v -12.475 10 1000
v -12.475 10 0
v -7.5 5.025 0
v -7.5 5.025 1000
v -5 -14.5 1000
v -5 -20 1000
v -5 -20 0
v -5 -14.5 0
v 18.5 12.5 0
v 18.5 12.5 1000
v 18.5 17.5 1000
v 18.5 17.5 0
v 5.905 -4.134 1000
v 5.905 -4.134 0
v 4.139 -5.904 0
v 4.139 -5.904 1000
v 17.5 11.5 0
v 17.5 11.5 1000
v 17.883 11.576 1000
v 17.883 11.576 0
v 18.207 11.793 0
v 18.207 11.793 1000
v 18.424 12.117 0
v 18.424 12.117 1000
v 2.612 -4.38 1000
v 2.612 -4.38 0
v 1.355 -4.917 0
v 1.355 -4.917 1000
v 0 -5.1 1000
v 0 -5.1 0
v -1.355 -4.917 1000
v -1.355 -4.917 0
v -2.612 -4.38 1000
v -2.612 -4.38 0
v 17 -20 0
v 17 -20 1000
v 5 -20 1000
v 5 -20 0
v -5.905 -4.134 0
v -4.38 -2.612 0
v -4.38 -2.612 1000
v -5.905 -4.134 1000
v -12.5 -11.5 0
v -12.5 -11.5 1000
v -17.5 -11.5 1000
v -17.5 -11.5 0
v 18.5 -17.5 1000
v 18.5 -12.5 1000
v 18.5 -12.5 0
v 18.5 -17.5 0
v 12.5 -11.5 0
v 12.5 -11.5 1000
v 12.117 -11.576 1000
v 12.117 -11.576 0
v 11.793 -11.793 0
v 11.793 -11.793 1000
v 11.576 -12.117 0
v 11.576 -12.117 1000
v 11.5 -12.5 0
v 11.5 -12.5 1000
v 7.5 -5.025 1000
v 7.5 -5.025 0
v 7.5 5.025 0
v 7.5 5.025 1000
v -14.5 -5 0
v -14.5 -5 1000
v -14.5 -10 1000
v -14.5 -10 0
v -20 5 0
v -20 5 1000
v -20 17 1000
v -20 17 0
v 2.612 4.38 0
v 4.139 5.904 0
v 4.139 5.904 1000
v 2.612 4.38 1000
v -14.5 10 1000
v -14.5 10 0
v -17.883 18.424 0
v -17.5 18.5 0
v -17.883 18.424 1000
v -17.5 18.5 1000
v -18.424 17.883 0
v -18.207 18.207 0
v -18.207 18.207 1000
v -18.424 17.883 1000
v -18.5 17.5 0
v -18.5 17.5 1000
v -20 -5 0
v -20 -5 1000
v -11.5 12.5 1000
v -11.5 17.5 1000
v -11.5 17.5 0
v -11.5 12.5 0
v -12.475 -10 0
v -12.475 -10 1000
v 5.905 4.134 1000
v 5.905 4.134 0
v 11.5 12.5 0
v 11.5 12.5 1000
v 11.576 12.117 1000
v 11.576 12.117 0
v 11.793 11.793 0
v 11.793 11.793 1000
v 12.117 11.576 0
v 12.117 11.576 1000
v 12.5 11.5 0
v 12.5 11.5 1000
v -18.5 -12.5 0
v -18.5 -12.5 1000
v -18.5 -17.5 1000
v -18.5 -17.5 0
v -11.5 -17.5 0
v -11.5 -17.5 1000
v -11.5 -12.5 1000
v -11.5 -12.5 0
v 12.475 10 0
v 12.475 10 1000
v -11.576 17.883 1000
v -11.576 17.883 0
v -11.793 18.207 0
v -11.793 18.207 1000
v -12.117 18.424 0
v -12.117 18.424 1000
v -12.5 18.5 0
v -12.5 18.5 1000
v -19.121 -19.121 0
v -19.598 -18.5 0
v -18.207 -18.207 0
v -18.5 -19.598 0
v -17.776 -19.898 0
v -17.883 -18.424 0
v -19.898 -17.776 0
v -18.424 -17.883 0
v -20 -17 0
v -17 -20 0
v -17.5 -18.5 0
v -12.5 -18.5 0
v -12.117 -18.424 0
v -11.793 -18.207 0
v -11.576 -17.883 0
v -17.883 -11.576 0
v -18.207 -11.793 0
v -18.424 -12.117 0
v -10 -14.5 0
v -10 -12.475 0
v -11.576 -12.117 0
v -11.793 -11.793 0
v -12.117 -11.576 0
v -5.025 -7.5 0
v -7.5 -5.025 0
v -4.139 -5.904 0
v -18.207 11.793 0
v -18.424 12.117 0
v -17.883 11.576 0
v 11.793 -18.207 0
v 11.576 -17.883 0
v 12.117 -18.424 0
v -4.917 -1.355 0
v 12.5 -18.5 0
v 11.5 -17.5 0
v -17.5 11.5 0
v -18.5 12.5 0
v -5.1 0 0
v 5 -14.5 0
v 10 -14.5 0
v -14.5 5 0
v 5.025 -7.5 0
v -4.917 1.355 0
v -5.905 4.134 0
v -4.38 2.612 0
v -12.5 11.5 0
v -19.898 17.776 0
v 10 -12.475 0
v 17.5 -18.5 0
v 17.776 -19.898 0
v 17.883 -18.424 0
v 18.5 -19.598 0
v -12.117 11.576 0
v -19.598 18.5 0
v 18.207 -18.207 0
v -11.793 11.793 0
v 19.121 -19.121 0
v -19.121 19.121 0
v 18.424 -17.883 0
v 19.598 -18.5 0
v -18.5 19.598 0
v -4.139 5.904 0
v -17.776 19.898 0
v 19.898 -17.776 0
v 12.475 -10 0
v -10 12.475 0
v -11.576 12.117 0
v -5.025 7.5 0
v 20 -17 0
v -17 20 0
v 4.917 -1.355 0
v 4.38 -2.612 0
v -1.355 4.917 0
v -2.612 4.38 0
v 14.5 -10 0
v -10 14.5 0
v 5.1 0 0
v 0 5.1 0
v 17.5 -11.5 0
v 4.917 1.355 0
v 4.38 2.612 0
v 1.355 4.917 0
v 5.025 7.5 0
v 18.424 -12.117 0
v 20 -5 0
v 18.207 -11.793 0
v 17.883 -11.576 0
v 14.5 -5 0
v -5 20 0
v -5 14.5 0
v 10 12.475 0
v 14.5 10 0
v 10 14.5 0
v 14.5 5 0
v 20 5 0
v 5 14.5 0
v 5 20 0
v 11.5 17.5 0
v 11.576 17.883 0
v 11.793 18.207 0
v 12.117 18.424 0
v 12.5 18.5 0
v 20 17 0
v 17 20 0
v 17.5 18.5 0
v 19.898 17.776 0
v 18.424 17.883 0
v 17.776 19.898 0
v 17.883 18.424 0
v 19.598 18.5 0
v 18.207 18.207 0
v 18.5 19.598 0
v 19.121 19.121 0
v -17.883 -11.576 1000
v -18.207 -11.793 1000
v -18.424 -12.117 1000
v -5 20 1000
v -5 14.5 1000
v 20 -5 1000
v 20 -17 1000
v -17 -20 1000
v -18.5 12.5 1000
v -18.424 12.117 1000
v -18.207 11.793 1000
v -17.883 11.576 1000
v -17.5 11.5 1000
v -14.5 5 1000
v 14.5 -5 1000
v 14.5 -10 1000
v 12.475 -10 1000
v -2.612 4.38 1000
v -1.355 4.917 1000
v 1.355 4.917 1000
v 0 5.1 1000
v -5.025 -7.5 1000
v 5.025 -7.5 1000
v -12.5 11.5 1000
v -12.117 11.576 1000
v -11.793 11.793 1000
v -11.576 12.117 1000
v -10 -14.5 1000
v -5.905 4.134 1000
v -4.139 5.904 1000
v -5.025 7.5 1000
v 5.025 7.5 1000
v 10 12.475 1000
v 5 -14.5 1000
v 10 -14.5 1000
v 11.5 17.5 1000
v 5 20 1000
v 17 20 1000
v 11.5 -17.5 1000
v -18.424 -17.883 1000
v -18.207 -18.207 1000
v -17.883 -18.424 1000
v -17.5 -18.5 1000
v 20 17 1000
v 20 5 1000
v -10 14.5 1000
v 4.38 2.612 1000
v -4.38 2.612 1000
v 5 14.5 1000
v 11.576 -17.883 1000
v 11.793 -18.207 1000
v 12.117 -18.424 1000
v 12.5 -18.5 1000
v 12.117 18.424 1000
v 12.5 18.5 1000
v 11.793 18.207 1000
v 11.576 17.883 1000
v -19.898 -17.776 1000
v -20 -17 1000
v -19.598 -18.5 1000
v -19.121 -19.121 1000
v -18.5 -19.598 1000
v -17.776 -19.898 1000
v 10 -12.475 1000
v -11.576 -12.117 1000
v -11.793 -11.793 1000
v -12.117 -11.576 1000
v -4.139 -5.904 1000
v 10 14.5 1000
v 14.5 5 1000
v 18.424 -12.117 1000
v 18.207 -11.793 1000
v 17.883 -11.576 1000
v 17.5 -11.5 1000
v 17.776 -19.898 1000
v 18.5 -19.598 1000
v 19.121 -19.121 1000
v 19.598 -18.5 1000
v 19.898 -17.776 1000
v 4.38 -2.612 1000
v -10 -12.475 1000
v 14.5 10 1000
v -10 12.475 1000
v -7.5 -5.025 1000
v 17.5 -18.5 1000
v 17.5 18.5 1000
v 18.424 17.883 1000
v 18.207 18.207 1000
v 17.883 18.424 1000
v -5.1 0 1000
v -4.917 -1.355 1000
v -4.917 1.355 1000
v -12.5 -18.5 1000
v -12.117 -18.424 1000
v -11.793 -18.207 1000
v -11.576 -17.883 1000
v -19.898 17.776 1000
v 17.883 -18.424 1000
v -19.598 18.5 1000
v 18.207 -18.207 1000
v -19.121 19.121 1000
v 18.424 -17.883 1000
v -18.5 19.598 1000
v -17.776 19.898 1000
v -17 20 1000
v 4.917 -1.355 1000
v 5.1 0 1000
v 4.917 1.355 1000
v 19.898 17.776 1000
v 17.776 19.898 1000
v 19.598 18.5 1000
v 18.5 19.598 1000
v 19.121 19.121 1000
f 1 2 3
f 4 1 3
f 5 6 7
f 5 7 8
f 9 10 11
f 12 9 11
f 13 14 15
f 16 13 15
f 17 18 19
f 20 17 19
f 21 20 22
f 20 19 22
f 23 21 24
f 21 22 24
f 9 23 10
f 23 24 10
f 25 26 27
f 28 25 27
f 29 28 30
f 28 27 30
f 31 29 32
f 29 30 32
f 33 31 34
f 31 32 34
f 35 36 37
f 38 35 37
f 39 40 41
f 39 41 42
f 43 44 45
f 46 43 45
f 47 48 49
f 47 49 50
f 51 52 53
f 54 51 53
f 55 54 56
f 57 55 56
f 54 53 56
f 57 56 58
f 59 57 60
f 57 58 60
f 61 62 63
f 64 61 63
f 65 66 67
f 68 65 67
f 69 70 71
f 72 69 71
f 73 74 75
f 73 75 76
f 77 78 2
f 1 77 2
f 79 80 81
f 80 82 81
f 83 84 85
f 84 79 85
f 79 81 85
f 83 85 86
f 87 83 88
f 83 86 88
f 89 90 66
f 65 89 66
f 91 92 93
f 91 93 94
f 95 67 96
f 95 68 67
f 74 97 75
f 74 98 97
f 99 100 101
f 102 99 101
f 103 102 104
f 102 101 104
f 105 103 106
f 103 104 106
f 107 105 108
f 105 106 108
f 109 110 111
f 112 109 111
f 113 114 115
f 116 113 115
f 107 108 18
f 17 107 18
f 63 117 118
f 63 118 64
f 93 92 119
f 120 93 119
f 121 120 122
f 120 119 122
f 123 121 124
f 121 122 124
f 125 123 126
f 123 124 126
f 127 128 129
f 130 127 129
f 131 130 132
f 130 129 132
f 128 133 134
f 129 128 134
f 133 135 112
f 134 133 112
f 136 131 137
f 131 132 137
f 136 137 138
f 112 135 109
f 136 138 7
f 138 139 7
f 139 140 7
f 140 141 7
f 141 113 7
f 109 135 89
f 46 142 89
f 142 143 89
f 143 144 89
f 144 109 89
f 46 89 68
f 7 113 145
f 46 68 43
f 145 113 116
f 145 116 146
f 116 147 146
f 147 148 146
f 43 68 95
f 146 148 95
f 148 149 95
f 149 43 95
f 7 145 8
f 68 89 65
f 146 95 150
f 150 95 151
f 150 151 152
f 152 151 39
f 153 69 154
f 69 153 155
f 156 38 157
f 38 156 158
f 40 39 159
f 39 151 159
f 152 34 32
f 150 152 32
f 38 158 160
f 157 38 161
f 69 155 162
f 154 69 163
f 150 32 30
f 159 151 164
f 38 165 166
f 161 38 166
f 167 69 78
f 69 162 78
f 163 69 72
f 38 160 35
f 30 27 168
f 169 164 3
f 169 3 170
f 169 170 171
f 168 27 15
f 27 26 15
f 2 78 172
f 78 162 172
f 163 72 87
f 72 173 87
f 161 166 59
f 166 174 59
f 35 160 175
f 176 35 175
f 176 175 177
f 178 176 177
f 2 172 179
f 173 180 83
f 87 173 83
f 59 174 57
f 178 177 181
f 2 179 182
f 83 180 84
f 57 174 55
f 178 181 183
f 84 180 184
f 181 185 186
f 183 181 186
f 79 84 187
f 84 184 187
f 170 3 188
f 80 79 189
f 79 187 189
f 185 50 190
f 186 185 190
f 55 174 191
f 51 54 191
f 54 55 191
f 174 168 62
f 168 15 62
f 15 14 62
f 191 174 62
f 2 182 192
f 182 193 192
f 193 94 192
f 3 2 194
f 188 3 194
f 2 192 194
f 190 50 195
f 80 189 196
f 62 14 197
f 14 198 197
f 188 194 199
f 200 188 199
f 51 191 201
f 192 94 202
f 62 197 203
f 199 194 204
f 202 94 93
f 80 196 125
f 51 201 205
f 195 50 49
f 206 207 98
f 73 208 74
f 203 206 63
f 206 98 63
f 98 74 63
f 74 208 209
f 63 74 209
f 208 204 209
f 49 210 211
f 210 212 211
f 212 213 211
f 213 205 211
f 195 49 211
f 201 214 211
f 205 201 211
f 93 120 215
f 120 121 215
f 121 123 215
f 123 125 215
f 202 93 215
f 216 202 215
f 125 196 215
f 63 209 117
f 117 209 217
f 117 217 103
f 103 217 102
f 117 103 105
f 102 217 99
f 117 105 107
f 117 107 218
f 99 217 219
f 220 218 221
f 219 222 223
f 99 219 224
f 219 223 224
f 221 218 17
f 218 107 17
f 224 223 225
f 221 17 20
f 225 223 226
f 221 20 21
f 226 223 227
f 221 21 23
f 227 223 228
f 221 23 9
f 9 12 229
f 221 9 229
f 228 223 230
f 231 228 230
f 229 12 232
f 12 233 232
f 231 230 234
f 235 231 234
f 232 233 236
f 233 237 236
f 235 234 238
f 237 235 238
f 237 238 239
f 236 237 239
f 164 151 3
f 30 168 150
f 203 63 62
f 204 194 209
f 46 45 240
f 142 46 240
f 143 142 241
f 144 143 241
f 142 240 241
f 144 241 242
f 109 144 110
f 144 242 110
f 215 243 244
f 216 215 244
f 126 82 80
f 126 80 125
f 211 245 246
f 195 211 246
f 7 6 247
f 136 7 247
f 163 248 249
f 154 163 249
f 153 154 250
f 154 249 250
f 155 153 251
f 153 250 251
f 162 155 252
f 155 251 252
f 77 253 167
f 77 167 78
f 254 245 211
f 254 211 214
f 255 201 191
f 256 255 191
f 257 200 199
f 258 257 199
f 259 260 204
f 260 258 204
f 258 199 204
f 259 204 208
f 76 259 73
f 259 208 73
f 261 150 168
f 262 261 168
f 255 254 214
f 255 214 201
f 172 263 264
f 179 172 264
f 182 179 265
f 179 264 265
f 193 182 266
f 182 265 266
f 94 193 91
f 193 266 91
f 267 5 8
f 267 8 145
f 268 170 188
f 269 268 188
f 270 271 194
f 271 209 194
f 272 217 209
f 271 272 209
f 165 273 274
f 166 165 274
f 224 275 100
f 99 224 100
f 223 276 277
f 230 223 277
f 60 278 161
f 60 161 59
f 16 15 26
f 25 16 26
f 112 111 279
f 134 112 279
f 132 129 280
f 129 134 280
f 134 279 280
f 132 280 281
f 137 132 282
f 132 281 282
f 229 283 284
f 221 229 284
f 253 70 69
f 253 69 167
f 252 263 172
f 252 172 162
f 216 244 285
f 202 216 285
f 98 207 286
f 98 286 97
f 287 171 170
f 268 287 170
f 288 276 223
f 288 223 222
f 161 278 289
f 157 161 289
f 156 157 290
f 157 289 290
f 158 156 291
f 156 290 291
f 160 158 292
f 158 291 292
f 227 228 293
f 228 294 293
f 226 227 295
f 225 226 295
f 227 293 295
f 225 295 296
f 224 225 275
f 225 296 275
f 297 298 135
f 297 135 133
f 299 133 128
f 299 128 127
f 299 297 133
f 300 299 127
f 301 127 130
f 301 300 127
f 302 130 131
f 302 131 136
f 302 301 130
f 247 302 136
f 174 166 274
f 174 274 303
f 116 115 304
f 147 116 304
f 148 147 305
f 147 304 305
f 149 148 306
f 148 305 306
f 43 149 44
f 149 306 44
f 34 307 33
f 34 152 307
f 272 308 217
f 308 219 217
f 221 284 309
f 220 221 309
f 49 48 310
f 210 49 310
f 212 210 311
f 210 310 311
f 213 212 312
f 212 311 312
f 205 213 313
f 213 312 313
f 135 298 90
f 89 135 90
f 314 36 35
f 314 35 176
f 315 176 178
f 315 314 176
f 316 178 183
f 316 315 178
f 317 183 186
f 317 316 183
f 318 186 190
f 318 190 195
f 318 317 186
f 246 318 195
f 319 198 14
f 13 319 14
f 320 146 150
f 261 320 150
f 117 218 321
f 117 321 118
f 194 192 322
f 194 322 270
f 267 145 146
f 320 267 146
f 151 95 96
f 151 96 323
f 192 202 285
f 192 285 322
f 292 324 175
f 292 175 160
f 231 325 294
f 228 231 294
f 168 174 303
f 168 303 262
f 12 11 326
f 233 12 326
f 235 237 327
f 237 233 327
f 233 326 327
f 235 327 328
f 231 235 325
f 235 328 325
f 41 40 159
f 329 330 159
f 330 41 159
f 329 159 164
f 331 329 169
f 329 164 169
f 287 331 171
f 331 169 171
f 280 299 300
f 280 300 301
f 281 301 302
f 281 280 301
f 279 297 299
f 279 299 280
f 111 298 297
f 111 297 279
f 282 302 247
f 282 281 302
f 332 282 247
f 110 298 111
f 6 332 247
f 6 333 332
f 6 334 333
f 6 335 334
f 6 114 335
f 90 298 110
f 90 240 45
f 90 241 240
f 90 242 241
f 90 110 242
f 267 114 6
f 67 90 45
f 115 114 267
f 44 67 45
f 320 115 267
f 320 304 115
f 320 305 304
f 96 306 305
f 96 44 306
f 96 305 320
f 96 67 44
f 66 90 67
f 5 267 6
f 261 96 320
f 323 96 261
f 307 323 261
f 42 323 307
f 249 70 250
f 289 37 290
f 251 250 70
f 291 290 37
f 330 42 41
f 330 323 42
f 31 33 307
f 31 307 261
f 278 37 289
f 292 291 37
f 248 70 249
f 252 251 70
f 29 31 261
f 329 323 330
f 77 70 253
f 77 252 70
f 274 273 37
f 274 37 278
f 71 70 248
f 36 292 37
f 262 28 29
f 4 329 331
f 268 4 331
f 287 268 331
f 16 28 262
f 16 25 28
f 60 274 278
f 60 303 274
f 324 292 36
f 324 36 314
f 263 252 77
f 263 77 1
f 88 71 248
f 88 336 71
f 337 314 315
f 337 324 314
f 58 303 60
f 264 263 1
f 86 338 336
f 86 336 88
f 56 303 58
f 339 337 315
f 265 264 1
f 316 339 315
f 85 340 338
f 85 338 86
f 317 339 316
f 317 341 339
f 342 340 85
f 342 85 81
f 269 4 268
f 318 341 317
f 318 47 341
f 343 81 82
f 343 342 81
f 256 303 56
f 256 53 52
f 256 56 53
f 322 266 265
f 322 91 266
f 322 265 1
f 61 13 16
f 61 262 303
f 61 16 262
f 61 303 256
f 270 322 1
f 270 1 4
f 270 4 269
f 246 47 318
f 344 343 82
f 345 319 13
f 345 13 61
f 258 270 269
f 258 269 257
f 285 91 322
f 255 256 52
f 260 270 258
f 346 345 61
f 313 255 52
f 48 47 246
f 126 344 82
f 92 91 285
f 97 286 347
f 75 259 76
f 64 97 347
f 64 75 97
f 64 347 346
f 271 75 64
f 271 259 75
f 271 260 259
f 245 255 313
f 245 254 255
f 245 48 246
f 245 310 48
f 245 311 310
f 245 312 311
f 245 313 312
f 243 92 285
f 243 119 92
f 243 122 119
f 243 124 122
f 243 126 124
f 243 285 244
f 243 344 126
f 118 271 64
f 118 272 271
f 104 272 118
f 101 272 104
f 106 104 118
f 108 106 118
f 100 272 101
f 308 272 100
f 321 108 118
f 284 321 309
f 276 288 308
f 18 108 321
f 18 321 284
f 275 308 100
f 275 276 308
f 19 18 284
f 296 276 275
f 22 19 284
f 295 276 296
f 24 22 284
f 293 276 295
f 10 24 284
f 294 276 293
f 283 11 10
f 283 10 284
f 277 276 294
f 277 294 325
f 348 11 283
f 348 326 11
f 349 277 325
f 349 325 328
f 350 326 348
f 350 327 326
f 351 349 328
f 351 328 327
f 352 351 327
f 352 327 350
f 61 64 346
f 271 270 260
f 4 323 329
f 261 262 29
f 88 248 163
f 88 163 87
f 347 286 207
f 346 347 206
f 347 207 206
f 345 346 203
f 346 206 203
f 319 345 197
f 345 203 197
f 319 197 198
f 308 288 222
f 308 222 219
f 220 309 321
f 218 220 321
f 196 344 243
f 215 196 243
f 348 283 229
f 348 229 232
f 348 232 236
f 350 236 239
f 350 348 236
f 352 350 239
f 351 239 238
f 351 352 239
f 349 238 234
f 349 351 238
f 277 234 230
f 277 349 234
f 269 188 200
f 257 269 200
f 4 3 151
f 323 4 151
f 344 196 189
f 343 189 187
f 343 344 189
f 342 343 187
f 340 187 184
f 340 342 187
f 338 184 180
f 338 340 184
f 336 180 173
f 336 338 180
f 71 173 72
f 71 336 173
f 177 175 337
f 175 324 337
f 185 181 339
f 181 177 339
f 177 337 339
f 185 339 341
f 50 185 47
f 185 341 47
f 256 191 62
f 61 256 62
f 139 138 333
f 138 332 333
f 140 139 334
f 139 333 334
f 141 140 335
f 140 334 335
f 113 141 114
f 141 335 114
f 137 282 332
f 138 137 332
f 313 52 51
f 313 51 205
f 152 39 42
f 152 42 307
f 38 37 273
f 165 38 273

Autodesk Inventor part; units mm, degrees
ref_plane "YZ Plane" through (0, 0, 0) normal (1, 0, 0) x (0, 1, 0)
ref_plane "XZ Plane" through (0, 0, 0) normal (0, 1, 0) x (-1, 0, 0)
ref_plane "XY Plane" through (0, 0, 0) normal (0, 0, 1) x (1, 0, 0)
sketch "T-Slot 4040 Base" plane through (0, 0, 0) normal (0, 0, 1) x (1, 0, 0)
  line L0 (-28, 0) -> (28, 0) construction
  line L1 (0, -28) -> (0, 28) construction
  circle A0 centre (0, 0) radius 5.1
  line L2 (-7.5, -7.5) -> (7.5, -7.5)
  line L3 (7.5, -7.5) -> (7.5, 7.5)
  line L4 (7.5, 7.5) -> (-7.5, 7.5)
  line L5 (-7.5, 7.5) -> (-7.5, -7.5)
  line L6 (-7.5, -7.5) -> (7.5, 7.5) construction
  line L7 (7.5, -7.5) -> (-7.5, 7.5) construction
  line L8 (-20, 20) -> (20, 20)
  line L9 (20, 20) -> (20, -20)
  line L10 (20, -20) -> (-20, -20)
  line L11 (-20, -20) -> (-20, 20)
  line L12 (-20, 20) -> (20, -20) construction
  line L13 (20, 20) -> (-20, -20) construction
  line L14 (20, 5) -> (14.5, 5)
  line L15 (14.5, 5) -> (14.5, 10)
  line L16 (14.5, 10) -> (12.4749, 10)
  line L17 (12.4749, 10) -> (7.5, 5.0251)
  line L18 (5, 20) -> (5, 14.5)
  line L19 (5, 14.5) -> (10, 14.5)
  line L20 (10, 14.5) -> (10, 12.4749)
  line L21 (10, 12.4749) -> (5.0251, 7.5)
  line L22 (18.5, 18.5) -> (11.5, 18.5)
  line L23 (11.5, 18.5) -> (11.5, 11.5)
  line L24 (11.5, 11.5) -> (18.5, 11.5)
  line L25 (18.5, 11.5) -> (18.5, 18.5)
  line L26 (18.5, 18.5) -> (11.5, 11.5) construction
  line L27 (11.5, 18.5) -> (18.5, 11.5) construction
  line L28 (3.0732, 1.3088) -> (4.38, 2.6125) construction
  line L29 (5.905, 4.1338) -> (4.1393, 5.9037)
  line L30 (4.1393, 5.9037) -> (2.6122, 4.3802)
  line L31 (1.3075, 3.0787) -> (3.0732, 1.3088) construction
  line L32 (3.0732, 1.3088) -> (4.1393, 5.9037) construction
  line L33 (5.905, 4.1338) -> (1.3075, 3.0787) construction
  line L34 (4.38, 2.6125) -> (5.905, 4.1338)
  line L35 (2.6122, 4.3802) -> (1.3075, 3.0787) construction
  line L36 (-20, 5) -> (-14.5, 5)
  line L37 (-14.5, 5) -> (-14.5, 10)
  line L38 (-14.5, 10) -> (-12.4749, 10)
  line L39 (-12.4749, 10) -> (-7.5, 5.0251)
  line L40 (-5, 20) -> (-5, 14.5)
  line L41 (-5, 14.5) -> (-10, 14.5)
  line L42 (-10, 14.5) -> (-10, 12.4749)
  line L43 (-10, 12.4749) -> (-5.0251, 7.5)
  line L44 (-18.5, 18.5) -> (-11.5, 18.5)
  line L45 (-11.5, 18.5) -> (-11.5, 11.5)
  line L46 (-11.5, 11.5) -> (-18.5, 11.5)
  line L47 (-18.5, 11.5) -> (-18.5, 18.5)
  line L48 (-5.905, 4.1338) -> (-4.1393, 5.9037)
  line L49 (-4.1393, 5.9037) -> (-2.6122, 4.3802)
  line L50 (-4.38, 2.6125) -> (-5.905, 4.1338)
  line L51 (7.5, -7.5) -> (-7.5, -7.5)
  line L52 (20, -5) -> (14.5, -5)
  line L53 (14.5, -5) -> (14.5, -10)
  line L54 (14.5, -10) -> (12.4749, -10)
  line L55 (12.4749, -10) -> (7.5, -5.0251)
  line L56 (5, -20) -> (5, -14.5)
  line L57 (5, -14.5) -> (10, -14.5)
  line L58 (10, -14.5) -> (10, -12.4749)
  line L59 (10, -12.4749) -> (5.0251, -7.5)
  line L60 (18.5, -18.5) -> (11.5, -18.5)
  line L61 (11.5, -18.5) -> (11.5, -11.5)
  line L62 (11.5, -11.5) -> (18.5, -11.5)
  line L63 (18.5, -11.5) -> (18.5, -18.5)
  line L64 (18.5, -18.5) -> (11.5, -11.5) construction
  line L65 (11.5, -18.5) -> (18.5, -11.5) construction
  line L66 (3.0732, -1.3088) -> (4.38, -2.6125) construction
  line L67 (5.905, -4.1338) -> (4.1393, -5.9037)
  line L68 (4.1393, -5.9037) -> (2.6122, -4.3802)
  line L69 (1.3075, -3.0787) -> (3.0732, -1.3088) construction
  line L70 (3.0732, -1.3088) -> (4.1393, -5.9037) construction
  line L71 (5.905, -4.1338) -> (1.3075, -3.0787) construction
  line L72 (4.38, -2.6125) -> (5.905, -4.1338)
  line L73 (2.6122, -4.3802) -> (1.3075, -3.0787) construction
  line L74 (-4.38, -2.6125) -> (-5.905, -4.1338)
  line L75 (-4.1393, -5.9037) -> (-2.6122, -4.3802)
  line L76 (-5.905, -4.1338) -> (-4.1393, -5.9037)
  line L77 (-12.4749, -10) -> (-7.5, -5.0251)
  line L78 (-10, -12.4749) -> (-5.0251, -7.5)
  line L79 (-10, -14.5) -> (-10, -12.4749)
  line L80 (-5, -14.5) -> (-10, -14.5)
  line L81 (-5, -20) -> (-5, -14.5)
  line L82 (-18.5, -18.5) -> (-11.5, -18.5)
  line L83 (-11.5, -18.5) -> (-11.5, -11.5)
  line L84 (-11.5, -11.5) -> (-18.5, -11.5)
  line L85 (-18.5, -11.5) -> (-18.5, -18.5)
  line L86 (-14.5, -10) -> (-12.4749, -10)
  line L87 (-14.5, -5) -> (-14.5, -10)
  line L88 (-20, -5) -> (-14.5, -5)
  point P0 (15, 15)
  point P1 (3.6062, 3.6062)
  point P2 (3.6062, 3.6062)
  point P3 (15, -15)
  point P4 (3.6062, -3.6062)
  point P5 (3.6062, -3.6062)
  dimension "d9" = 10.2
  dimension "d12" = 40
  dimension "d13" = 40
  dimension "d14" = 5.5
  dimension "d15" = 15
  dimension "d16" = 7
  dimension "d17" = 10
  dimension "d20" = 1.75
  dimension "d21" = 7
  dimension "d22" = 2
  dimension "d29" = 1.5
  dimension "d30" = 2.5
extrude "Extrusion1" add sketch "T-Slot 4040 Base" along normal blind 1000 contours L5 L4 L3 L2 | L2 L78 L79 L80 L81 L10 L11 L88 L87 L86 L77 L5 | L2 L3 L55 L54 L53 L52 L9 L10 L56 L57 L58 L59 | L39 L38 L37 L36 L11 L8 L40 L41 L42 L43 L4 L5 | L3 L4 L21 L20 L19 L18 L8 L9 L14 L15 L16 L17
fillet "Rundung1" radius 1 16 edges at (11.5, 18.5, 500) (18.5, 18.5, 500) (18.5, 11.5, 500) (11.5, 11.5, 500) (-11.5, 18.5, 500) (-18.5, 18.5, 500) (-18.5, 11.5, 500) (-11.5, 11.5, 500) (-18.5, -11.5, 500) (-11.5, -11.5, 500) (-11.5, -18.5, 500) (-18.5, -18.5, 500) (11.5, -18.5, 500) (11.5, -11.5, 500) (18.5, -11.5, 500) (18.5, -18.5, 500)
fillet "Rundung2" radius 3 4 edges at (20, 20, 500) (20, -20, 500) (-20, -20, 500) (-20, 20, 500)
properties part number "T-SLOT 4040 B-Type 1000mm"
